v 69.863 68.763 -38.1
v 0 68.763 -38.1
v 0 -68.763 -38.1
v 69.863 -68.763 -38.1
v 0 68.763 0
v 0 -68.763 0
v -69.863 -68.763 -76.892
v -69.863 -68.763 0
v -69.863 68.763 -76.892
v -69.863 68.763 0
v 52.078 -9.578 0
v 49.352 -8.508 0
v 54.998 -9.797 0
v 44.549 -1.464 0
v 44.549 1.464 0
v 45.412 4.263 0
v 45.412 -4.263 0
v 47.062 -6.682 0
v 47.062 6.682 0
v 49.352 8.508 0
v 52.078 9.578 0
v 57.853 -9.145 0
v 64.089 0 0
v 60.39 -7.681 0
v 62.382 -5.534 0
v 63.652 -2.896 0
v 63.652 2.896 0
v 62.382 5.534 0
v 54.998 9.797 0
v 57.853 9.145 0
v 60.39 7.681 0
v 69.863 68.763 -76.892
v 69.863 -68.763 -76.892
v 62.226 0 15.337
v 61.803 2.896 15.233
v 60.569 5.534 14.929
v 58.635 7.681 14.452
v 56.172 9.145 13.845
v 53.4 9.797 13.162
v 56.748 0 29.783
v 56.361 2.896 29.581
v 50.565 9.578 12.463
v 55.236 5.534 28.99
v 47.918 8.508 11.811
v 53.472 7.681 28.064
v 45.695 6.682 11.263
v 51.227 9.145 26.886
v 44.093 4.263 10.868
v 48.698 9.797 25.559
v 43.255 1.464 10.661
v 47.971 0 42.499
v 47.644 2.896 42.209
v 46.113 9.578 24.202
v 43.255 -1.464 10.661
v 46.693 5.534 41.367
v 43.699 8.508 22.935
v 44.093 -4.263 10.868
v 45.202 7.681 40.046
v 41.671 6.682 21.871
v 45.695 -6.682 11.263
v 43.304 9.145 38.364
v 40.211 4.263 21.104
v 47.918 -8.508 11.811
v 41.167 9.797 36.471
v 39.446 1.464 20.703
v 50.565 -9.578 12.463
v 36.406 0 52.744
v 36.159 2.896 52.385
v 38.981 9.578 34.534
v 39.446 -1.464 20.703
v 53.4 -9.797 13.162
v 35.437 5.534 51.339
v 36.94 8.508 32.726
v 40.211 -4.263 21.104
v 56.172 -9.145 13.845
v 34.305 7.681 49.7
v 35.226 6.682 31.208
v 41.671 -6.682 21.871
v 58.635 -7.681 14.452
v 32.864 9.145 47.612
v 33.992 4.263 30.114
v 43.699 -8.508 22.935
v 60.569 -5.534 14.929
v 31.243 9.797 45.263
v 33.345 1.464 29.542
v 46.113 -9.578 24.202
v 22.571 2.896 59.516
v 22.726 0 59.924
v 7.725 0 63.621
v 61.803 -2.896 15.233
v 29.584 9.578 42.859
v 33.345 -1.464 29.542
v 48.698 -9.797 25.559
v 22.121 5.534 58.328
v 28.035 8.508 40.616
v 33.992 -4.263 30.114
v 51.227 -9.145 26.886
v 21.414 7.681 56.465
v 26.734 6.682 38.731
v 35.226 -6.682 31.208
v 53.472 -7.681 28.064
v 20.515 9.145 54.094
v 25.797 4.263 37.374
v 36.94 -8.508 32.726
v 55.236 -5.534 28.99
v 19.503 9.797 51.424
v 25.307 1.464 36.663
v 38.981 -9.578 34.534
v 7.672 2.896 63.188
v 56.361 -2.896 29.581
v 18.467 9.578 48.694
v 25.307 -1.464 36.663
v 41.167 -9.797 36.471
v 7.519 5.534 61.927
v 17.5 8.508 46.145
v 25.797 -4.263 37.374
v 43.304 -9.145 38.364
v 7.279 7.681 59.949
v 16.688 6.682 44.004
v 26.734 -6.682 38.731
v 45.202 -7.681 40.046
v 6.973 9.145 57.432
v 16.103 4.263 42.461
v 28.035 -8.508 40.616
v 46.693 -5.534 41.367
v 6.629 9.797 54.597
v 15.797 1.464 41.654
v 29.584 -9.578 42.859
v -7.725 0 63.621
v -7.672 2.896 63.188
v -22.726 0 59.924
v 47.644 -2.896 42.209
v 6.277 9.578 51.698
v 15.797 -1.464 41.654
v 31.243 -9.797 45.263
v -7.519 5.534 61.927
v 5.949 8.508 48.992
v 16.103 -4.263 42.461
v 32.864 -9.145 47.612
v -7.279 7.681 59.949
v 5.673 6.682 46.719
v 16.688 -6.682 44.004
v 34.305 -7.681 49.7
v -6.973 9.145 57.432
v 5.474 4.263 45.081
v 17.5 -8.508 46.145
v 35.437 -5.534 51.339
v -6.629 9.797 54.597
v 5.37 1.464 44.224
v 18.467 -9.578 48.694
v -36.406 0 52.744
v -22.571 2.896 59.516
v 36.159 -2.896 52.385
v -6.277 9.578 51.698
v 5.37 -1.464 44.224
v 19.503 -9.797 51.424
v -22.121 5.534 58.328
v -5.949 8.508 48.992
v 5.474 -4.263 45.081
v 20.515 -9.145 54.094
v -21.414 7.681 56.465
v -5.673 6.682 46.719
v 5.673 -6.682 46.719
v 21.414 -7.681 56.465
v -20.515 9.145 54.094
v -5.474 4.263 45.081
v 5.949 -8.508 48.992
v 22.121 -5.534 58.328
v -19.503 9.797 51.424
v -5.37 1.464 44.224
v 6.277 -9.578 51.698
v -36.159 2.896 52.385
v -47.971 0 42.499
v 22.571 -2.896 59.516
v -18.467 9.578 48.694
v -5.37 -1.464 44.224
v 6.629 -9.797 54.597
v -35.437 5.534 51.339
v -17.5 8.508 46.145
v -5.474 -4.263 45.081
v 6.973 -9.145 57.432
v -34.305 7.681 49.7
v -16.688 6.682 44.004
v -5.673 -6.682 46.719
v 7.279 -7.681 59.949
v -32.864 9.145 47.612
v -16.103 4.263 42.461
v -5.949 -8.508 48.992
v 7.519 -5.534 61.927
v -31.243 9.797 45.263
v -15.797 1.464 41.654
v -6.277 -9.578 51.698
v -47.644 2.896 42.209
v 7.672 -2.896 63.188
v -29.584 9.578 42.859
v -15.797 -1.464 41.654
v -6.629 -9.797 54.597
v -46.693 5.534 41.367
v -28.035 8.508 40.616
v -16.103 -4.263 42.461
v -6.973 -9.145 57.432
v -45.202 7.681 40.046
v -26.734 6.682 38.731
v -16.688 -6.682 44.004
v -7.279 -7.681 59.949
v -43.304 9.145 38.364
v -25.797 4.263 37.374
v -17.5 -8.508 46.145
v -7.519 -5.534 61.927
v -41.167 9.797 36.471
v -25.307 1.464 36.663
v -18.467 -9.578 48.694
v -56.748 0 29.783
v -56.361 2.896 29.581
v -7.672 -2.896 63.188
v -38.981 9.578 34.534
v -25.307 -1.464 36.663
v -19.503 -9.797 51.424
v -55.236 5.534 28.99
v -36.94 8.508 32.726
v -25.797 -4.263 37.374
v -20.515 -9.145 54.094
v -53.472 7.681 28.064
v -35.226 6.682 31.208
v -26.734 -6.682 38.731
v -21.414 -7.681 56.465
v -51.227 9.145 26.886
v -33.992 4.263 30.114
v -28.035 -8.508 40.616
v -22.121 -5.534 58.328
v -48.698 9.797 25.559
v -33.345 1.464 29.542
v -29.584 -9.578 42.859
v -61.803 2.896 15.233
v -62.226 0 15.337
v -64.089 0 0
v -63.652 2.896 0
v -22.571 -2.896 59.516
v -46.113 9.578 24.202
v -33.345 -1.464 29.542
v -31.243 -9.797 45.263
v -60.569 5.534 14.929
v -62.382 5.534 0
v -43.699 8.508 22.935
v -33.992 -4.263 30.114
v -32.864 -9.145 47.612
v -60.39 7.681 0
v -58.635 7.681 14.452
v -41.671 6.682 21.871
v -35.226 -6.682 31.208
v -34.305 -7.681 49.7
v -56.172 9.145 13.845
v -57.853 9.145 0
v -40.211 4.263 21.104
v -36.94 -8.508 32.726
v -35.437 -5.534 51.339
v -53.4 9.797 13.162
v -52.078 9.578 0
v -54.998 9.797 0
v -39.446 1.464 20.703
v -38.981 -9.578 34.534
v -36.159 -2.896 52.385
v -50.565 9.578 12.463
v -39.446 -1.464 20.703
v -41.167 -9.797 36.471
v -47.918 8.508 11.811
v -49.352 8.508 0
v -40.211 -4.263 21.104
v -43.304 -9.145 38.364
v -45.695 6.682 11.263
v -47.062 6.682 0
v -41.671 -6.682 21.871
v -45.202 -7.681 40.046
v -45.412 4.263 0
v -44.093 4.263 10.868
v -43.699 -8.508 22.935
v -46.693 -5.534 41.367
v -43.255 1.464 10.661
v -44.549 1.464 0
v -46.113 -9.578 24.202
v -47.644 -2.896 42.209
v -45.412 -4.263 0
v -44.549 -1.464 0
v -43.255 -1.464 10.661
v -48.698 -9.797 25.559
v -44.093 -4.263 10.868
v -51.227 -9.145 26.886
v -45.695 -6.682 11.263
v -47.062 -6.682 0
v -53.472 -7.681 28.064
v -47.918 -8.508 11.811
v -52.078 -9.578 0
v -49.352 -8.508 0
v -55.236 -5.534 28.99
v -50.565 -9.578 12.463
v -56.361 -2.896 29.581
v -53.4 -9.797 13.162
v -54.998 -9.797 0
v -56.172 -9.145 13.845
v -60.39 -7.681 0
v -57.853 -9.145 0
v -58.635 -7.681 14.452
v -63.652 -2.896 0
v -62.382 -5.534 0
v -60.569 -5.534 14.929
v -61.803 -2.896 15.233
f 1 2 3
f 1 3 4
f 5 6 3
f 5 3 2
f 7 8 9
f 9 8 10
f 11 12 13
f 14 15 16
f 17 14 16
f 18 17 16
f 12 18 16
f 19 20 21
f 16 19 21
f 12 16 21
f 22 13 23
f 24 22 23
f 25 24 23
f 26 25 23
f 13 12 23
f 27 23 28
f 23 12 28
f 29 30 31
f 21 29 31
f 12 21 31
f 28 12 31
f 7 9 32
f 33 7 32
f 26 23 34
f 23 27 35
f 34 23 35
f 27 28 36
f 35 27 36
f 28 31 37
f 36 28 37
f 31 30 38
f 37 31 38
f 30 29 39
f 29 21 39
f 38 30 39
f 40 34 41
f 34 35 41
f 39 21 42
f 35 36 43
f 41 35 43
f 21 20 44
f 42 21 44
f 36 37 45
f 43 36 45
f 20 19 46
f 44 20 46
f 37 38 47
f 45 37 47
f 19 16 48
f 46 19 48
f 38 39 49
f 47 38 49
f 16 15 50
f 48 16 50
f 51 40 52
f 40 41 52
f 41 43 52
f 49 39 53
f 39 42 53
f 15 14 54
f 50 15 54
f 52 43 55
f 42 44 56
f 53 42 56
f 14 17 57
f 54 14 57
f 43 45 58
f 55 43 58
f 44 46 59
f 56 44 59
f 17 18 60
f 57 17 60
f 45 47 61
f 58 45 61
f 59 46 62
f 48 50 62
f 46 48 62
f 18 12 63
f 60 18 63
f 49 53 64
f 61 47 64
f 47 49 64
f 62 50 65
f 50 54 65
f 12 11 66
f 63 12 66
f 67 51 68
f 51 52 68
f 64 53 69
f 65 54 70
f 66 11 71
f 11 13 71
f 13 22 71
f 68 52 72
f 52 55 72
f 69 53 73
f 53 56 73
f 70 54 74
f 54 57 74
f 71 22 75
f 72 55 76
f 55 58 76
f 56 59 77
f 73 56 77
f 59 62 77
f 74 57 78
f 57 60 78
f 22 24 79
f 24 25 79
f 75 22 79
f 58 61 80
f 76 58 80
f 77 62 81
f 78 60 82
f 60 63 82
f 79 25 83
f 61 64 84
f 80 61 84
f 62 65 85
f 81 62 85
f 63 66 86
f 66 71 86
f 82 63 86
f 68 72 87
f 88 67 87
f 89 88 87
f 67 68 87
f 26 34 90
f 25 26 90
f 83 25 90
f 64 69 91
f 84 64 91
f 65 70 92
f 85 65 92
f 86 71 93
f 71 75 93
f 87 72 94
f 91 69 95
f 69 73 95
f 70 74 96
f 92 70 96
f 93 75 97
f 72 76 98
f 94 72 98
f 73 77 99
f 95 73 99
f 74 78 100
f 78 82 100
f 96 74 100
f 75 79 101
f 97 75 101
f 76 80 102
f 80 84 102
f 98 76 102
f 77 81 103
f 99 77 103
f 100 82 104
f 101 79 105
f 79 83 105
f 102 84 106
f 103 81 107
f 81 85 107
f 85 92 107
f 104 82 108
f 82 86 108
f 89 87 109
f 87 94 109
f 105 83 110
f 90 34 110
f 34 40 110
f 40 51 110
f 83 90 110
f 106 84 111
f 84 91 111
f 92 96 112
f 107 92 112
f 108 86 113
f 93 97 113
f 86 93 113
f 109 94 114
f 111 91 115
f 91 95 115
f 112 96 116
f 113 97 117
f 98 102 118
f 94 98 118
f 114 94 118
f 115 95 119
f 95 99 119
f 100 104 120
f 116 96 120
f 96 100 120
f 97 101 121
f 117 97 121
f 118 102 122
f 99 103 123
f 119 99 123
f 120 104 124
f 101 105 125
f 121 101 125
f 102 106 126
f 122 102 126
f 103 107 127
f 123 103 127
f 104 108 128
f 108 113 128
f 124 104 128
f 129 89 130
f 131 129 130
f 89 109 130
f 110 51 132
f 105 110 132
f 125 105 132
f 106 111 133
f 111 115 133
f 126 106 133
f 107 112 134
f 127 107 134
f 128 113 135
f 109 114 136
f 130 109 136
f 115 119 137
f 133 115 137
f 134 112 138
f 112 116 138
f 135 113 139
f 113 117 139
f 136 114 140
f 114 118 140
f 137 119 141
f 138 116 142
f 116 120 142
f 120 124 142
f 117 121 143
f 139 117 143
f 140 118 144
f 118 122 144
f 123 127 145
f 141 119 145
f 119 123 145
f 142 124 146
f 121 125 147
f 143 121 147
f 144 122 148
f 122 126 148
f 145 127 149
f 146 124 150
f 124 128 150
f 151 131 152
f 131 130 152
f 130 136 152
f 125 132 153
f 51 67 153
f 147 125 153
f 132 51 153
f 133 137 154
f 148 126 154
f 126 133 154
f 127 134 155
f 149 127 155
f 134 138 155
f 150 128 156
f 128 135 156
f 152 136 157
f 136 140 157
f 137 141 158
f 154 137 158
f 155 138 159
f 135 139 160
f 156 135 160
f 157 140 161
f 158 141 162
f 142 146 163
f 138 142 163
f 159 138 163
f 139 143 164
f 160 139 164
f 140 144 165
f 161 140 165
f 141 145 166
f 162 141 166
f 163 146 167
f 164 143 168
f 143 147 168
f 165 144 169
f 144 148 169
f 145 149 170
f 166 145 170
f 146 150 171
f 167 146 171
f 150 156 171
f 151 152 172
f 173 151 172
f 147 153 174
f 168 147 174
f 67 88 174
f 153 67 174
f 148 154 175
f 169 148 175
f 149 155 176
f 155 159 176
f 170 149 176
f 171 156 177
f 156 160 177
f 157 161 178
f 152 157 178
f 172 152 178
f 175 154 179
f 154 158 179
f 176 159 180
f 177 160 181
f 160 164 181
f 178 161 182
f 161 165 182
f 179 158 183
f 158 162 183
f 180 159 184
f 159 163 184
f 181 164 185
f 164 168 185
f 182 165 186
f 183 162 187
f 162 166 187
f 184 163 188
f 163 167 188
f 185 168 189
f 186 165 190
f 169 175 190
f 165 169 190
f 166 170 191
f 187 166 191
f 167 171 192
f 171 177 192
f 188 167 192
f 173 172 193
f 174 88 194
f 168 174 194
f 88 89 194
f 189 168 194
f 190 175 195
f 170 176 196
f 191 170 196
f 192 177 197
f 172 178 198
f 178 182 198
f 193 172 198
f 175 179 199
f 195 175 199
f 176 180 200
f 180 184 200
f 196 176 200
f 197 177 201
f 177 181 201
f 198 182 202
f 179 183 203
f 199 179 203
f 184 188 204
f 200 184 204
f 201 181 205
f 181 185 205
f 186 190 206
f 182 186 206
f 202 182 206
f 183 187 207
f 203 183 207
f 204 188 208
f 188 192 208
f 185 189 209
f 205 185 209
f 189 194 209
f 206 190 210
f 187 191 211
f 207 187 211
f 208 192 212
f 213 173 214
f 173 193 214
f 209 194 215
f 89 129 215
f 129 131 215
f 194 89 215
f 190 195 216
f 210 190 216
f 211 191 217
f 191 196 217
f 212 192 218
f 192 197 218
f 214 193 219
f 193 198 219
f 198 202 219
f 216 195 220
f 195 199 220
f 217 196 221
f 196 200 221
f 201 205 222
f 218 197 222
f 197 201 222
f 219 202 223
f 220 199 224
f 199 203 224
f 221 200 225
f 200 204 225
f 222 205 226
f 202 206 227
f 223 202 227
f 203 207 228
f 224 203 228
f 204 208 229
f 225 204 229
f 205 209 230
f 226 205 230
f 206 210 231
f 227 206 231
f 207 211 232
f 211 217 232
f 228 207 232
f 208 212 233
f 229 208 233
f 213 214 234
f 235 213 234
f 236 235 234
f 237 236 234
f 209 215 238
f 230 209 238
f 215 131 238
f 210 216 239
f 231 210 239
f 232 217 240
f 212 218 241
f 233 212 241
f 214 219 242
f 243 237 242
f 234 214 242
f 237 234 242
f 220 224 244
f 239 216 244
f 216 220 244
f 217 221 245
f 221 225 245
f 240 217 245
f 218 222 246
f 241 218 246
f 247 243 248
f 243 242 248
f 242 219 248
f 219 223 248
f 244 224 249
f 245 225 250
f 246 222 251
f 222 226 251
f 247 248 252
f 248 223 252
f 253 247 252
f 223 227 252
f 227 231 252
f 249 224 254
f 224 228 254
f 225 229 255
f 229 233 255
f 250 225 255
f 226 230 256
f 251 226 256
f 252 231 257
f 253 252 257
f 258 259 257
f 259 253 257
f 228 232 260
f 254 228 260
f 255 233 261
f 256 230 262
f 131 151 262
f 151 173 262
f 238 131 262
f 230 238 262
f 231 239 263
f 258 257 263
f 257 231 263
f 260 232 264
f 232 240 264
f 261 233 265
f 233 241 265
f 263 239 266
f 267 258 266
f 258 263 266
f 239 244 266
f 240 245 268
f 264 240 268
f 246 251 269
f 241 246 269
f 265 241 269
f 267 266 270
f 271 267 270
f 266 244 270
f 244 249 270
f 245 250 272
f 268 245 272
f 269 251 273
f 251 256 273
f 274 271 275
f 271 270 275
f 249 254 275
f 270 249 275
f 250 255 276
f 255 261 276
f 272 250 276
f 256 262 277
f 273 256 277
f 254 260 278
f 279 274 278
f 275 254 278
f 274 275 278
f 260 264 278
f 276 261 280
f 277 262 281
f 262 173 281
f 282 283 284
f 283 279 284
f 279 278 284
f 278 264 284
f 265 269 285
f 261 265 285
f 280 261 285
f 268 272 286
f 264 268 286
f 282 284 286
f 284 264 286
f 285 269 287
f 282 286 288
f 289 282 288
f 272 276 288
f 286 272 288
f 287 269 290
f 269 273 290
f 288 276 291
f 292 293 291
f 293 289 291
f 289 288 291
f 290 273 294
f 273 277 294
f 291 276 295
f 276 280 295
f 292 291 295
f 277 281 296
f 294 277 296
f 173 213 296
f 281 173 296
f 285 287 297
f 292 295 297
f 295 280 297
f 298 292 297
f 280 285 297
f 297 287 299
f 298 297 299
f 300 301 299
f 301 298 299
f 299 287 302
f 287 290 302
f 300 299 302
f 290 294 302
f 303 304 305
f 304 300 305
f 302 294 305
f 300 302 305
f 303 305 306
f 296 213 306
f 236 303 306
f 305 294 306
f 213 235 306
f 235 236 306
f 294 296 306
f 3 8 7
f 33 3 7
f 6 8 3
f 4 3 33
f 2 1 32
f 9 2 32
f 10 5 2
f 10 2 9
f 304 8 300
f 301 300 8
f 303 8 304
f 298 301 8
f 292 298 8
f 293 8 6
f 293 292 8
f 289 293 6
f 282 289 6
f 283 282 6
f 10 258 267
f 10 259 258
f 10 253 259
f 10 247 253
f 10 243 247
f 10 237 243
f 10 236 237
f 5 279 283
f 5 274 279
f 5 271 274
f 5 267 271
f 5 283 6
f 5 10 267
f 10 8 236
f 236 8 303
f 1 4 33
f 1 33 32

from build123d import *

# Parameters (mm, degrees)
F0_W     = 69.863096
F0_H     = 137.526572
F2_DEPTH = 76.89179
F1_R     = 9.824635
F4_DEPTH = 25.4
F5_DEPTH = 38.1


with BuildPart() as f2:
    # F0 (on Top) → F2 (new body)
    with BuildSketch(Plane.XY):
        with Locations((-34.931548, 0)):
            Rectangle(F0_W, F0_H)
        with Locations((34.931548, 0)):
            Rectangle(F0_W, F0_H)
    extrude(amount=-F2_DEPTH)

    # F1 (on Top) → F3 (revolve)
    with BuildSketch(Plane.XY):
        with Locations((54.264009, 0)):
            Circle(F1_R)
    revolve(axis=Axis((0, 0, 0), (0, -1, 0)))

    # F0 (on Top) → F4 (join)
    with BuildSketch(Plane.XY):
        with Locations((34.931548, 0)):
            Rectangle(F0_W, F0_H)
    extrude(amount=-F4_DEPTH)

    # F0 (on Top) → F5 (cut)
    with BuildSketch(Plane.XY):
        with Locations((34.931548, 0)):
            Rectangle(F0_W, F0_H)
    extrude(amount=-F5_DEPTH, mode=Mode.SUBTRACT)


solid = f2.part
